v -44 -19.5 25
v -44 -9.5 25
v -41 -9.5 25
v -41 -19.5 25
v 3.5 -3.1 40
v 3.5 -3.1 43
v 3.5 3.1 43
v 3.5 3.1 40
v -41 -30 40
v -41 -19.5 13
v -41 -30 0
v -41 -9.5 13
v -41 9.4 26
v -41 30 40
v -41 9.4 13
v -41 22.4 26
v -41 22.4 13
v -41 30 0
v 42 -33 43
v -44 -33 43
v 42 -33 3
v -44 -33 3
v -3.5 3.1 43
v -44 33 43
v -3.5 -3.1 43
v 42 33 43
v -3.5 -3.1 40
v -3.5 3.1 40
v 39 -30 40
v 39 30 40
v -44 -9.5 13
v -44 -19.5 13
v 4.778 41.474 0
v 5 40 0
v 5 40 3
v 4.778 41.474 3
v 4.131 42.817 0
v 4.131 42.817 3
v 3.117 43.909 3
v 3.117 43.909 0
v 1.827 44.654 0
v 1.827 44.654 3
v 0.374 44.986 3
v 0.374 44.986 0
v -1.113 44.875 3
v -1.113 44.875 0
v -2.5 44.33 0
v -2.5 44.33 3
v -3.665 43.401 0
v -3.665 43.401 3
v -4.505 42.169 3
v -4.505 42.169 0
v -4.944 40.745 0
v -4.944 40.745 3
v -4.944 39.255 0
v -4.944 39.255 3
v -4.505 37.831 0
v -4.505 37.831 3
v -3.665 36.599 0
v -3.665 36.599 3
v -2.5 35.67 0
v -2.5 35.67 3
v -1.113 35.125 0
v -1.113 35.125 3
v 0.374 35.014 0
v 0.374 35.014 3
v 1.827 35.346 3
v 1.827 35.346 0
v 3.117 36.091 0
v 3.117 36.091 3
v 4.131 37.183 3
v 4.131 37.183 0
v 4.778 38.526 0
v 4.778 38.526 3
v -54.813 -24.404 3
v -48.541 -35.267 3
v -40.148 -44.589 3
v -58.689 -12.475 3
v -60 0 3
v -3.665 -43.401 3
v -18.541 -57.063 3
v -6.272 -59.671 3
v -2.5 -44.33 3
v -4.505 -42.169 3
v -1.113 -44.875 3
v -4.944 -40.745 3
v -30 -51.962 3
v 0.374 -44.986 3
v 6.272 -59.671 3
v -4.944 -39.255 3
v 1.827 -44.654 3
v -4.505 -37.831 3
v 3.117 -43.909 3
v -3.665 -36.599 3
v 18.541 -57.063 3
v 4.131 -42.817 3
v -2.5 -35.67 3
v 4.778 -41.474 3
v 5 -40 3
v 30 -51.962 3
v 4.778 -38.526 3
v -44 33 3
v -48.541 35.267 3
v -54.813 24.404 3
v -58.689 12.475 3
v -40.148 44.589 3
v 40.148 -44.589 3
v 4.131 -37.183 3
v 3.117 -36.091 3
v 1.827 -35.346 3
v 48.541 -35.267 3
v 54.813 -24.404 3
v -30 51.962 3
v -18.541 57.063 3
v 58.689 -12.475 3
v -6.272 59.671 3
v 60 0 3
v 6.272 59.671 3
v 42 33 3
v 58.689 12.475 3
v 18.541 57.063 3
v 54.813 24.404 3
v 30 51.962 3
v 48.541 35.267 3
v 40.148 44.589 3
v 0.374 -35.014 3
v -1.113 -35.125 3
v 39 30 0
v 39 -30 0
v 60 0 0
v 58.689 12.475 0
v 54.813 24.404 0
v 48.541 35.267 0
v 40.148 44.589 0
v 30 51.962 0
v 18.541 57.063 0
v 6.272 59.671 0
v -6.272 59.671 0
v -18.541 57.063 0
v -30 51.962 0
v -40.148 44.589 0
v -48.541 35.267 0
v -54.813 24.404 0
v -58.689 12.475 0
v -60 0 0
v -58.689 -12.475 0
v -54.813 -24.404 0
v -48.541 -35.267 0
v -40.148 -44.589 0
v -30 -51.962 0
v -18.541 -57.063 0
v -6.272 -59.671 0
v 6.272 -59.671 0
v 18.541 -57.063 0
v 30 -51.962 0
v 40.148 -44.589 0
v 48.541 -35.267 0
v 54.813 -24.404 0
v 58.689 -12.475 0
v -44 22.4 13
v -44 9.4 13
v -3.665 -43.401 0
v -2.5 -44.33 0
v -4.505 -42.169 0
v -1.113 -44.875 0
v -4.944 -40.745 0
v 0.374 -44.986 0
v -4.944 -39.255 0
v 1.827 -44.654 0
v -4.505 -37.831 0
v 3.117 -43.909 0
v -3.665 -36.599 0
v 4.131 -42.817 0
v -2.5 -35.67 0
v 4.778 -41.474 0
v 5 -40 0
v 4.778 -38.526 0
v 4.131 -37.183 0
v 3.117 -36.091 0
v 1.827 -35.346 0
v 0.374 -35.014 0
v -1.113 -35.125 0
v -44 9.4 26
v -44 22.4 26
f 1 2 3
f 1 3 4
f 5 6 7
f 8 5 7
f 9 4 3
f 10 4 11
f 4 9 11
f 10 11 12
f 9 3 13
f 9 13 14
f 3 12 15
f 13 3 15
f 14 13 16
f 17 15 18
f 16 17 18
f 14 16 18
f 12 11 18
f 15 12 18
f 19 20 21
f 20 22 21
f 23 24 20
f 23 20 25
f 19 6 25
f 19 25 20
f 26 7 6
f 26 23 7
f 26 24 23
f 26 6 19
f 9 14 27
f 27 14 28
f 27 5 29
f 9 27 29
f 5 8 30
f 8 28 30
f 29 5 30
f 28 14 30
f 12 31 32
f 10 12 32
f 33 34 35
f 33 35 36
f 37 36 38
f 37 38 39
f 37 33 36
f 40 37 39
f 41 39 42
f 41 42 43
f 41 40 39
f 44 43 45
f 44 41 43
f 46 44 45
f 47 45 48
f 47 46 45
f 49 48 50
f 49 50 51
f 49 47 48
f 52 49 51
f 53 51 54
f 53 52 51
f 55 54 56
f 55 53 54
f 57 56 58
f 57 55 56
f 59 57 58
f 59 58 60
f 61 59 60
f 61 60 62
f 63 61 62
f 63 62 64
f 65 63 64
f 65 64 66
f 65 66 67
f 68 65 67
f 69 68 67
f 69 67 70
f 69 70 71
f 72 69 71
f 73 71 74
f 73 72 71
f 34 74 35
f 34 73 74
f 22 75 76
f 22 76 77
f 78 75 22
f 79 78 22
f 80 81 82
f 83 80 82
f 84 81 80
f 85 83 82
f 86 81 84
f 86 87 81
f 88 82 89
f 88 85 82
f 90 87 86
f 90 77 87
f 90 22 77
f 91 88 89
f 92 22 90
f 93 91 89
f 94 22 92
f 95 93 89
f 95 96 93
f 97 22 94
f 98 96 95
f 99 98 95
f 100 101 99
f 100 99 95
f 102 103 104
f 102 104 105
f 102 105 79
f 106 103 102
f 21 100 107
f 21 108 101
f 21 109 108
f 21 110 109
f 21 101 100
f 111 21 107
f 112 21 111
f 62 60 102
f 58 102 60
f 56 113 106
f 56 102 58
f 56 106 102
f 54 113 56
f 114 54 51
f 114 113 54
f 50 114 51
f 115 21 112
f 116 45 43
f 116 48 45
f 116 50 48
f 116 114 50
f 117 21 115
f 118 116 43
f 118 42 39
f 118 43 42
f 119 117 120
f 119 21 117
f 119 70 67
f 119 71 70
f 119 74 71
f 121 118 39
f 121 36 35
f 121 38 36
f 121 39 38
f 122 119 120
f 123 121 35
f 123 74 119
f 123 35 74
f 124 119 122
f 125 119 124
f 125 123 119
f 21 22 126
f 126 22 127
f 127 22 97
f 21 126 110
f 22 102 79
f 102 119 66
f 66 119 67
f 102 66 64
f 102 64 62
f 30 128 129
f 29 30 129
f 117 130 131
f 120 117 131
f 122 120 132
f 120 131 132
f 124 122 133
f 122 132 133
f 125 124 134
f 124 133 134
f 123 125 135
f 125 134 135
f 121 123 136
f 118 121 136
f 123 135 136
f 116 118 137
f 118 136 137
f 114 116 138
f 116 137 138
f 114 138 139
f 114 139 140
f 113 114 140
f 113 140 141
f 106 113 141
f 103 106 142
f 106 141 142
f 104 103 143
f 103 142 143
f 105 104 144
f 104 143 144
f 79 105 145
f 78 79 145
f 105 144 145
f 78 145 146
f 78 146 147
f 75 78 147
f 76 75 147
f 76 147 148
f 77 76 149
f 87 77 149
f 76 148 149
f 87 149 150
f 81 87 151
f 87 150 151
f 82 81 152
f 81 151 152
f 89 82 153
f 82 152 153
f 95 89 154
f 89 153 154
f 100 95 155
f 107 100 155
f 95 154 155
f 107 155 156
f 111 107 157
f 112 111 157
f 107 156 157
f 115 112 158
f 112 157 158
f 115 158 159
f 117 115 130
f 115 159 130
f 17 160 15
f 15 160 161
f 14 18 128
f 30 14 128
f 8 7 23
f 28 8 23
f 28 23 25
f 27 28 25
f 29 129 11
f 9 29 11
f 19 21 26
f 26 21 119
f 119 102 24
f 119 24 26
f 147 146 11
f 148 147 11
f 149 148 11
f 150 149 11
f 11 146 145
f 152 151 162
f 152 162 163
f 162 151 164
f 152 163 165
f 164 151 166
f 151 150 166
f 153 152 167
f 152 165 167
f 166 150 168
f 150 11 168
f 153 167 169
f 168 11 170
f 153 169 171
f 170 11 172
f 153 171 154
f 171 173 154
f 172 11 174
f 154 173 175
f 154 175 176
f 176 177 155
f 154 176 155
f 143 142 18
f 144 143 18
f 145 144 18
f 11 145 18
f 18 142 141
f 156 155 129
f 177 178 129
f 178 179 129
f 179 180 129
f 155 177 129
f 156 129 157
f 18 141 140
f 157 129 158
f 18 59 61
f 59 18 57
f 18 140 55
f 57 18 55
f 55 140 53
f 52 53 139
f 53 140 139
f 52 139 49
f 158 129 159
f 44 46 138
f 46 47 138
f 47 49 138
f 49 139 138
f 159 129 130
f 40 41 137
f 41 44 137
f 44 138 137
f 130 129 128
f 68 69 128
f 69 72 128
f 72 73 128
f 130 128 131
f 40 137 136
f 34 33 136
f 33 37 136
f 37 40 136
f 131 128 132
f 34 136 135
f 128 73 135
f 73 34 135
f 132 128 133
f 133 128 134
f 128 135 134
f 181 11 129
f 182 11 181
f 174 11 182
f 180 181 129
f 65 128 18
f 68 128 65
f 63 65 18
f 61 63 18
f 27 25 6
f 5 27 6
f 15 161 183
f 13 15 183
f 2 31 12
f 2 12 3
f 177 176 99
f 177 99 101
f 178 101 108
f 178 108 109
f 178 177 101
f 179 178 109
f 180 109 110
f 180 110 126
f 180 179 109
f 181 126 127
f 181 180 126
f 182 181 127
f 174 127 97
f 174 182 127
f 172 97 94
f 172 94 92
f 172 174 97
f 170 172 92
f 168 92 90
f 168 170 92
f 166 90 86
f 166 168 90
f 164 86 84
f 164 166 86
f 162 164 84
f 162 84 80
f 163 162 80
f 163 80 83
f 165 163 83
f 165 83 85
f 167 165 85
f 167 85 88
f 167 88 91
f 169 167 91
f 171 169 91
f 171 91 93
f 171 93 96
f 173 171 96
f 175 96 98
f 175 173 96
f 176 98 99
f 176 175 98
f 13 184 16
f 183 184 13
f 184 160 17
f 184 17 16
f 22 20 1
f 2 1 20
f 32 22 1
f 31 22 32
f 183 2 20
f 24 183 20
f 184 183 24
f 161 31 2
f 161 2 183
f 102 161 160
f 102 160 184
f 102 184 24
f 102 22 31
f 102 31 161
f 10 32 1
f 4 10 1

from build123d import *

# Parameters (mm, degrees)
F0_R     = 60
F0_R_2   = 5
F0_W     = 86
F0_H     = 66
F1_DEPTH = 3
F2_DEPTH = 40
F3_W     = 86
F3_H     = 66
F4_DEPTH = 3
F5_W     = 10
F5_H     = 12
F5_W_2   = 13
F5_H_2   = 13
F6_DEPTH = 25
F8_DEPTH = 25


with BuildPart() as f1:
    # F0 (on Top) → F1 (new body)
    with BuildSketch(Plane.XY):
        Circle(F0_R)
        with Locations((0, -40)):
            Circle(F0_R_2, mode=Mode.SUBTRACT)
        with Locations((-1, 0)):
            Rectangle(F0_W, F0_H, mode=Mode.SUBTRACT)
        with Locations((0, 40)):
            Circle(F0_R_2, mode=Mode.SUBTRACT)
    extrude(amount=F1_DEPTH)

    # F0 (on Top) → F2 (join)
    with BuildSketch(Plane.XY):
        with Locations((-1, 0)):
            Rectangle(F0_W, F0_H)
        Polygon((39, 30), (39, 2), (39, -30), (-41, -30), (-41, 0), (-41, 30), align=None, mode=Mode.SUBTRACT)
    extrude(amount=F2_DEPTH)

    # F3 (on face) → F4 (join)
    with BuildSketch(Plane.XY.offset(40)):
        with Locations((-1, 0)):
            Rectangle(F3_W, F3_H)
    extrude(amount=F4_DEPTH)

    # F5 (on face) → F6 (cut)
    with BuildSketch(Plane(origin=(-44, 0, 0), x_dir=(0, -1, 0), z_dir=(-1, 0, 0))):
        with Locations((14.5, 19)):
            Rectangle(F5_W, F5_H)
        with Locations((-15.9, 19.5)):
            Rectangle(F5_W_2, F5_H_2)
    extrude(amount=-F6_DEPTH, mode=Mode.SUBTRACT)

    # F7 (on face) → F8 (cut)
    with BuildSketch(Plane.XY.offset(43)):
        Polygon((3.5, -3.1), (3.5, 0), (3.5, 3.1), (-3.5, 3.1), (-3.5, 0), (-3.5, -3.1), align=None)
    extrude(amount=-F8_DEPTH, mode=Mode.SUBTRACT)


solid = f1.part
